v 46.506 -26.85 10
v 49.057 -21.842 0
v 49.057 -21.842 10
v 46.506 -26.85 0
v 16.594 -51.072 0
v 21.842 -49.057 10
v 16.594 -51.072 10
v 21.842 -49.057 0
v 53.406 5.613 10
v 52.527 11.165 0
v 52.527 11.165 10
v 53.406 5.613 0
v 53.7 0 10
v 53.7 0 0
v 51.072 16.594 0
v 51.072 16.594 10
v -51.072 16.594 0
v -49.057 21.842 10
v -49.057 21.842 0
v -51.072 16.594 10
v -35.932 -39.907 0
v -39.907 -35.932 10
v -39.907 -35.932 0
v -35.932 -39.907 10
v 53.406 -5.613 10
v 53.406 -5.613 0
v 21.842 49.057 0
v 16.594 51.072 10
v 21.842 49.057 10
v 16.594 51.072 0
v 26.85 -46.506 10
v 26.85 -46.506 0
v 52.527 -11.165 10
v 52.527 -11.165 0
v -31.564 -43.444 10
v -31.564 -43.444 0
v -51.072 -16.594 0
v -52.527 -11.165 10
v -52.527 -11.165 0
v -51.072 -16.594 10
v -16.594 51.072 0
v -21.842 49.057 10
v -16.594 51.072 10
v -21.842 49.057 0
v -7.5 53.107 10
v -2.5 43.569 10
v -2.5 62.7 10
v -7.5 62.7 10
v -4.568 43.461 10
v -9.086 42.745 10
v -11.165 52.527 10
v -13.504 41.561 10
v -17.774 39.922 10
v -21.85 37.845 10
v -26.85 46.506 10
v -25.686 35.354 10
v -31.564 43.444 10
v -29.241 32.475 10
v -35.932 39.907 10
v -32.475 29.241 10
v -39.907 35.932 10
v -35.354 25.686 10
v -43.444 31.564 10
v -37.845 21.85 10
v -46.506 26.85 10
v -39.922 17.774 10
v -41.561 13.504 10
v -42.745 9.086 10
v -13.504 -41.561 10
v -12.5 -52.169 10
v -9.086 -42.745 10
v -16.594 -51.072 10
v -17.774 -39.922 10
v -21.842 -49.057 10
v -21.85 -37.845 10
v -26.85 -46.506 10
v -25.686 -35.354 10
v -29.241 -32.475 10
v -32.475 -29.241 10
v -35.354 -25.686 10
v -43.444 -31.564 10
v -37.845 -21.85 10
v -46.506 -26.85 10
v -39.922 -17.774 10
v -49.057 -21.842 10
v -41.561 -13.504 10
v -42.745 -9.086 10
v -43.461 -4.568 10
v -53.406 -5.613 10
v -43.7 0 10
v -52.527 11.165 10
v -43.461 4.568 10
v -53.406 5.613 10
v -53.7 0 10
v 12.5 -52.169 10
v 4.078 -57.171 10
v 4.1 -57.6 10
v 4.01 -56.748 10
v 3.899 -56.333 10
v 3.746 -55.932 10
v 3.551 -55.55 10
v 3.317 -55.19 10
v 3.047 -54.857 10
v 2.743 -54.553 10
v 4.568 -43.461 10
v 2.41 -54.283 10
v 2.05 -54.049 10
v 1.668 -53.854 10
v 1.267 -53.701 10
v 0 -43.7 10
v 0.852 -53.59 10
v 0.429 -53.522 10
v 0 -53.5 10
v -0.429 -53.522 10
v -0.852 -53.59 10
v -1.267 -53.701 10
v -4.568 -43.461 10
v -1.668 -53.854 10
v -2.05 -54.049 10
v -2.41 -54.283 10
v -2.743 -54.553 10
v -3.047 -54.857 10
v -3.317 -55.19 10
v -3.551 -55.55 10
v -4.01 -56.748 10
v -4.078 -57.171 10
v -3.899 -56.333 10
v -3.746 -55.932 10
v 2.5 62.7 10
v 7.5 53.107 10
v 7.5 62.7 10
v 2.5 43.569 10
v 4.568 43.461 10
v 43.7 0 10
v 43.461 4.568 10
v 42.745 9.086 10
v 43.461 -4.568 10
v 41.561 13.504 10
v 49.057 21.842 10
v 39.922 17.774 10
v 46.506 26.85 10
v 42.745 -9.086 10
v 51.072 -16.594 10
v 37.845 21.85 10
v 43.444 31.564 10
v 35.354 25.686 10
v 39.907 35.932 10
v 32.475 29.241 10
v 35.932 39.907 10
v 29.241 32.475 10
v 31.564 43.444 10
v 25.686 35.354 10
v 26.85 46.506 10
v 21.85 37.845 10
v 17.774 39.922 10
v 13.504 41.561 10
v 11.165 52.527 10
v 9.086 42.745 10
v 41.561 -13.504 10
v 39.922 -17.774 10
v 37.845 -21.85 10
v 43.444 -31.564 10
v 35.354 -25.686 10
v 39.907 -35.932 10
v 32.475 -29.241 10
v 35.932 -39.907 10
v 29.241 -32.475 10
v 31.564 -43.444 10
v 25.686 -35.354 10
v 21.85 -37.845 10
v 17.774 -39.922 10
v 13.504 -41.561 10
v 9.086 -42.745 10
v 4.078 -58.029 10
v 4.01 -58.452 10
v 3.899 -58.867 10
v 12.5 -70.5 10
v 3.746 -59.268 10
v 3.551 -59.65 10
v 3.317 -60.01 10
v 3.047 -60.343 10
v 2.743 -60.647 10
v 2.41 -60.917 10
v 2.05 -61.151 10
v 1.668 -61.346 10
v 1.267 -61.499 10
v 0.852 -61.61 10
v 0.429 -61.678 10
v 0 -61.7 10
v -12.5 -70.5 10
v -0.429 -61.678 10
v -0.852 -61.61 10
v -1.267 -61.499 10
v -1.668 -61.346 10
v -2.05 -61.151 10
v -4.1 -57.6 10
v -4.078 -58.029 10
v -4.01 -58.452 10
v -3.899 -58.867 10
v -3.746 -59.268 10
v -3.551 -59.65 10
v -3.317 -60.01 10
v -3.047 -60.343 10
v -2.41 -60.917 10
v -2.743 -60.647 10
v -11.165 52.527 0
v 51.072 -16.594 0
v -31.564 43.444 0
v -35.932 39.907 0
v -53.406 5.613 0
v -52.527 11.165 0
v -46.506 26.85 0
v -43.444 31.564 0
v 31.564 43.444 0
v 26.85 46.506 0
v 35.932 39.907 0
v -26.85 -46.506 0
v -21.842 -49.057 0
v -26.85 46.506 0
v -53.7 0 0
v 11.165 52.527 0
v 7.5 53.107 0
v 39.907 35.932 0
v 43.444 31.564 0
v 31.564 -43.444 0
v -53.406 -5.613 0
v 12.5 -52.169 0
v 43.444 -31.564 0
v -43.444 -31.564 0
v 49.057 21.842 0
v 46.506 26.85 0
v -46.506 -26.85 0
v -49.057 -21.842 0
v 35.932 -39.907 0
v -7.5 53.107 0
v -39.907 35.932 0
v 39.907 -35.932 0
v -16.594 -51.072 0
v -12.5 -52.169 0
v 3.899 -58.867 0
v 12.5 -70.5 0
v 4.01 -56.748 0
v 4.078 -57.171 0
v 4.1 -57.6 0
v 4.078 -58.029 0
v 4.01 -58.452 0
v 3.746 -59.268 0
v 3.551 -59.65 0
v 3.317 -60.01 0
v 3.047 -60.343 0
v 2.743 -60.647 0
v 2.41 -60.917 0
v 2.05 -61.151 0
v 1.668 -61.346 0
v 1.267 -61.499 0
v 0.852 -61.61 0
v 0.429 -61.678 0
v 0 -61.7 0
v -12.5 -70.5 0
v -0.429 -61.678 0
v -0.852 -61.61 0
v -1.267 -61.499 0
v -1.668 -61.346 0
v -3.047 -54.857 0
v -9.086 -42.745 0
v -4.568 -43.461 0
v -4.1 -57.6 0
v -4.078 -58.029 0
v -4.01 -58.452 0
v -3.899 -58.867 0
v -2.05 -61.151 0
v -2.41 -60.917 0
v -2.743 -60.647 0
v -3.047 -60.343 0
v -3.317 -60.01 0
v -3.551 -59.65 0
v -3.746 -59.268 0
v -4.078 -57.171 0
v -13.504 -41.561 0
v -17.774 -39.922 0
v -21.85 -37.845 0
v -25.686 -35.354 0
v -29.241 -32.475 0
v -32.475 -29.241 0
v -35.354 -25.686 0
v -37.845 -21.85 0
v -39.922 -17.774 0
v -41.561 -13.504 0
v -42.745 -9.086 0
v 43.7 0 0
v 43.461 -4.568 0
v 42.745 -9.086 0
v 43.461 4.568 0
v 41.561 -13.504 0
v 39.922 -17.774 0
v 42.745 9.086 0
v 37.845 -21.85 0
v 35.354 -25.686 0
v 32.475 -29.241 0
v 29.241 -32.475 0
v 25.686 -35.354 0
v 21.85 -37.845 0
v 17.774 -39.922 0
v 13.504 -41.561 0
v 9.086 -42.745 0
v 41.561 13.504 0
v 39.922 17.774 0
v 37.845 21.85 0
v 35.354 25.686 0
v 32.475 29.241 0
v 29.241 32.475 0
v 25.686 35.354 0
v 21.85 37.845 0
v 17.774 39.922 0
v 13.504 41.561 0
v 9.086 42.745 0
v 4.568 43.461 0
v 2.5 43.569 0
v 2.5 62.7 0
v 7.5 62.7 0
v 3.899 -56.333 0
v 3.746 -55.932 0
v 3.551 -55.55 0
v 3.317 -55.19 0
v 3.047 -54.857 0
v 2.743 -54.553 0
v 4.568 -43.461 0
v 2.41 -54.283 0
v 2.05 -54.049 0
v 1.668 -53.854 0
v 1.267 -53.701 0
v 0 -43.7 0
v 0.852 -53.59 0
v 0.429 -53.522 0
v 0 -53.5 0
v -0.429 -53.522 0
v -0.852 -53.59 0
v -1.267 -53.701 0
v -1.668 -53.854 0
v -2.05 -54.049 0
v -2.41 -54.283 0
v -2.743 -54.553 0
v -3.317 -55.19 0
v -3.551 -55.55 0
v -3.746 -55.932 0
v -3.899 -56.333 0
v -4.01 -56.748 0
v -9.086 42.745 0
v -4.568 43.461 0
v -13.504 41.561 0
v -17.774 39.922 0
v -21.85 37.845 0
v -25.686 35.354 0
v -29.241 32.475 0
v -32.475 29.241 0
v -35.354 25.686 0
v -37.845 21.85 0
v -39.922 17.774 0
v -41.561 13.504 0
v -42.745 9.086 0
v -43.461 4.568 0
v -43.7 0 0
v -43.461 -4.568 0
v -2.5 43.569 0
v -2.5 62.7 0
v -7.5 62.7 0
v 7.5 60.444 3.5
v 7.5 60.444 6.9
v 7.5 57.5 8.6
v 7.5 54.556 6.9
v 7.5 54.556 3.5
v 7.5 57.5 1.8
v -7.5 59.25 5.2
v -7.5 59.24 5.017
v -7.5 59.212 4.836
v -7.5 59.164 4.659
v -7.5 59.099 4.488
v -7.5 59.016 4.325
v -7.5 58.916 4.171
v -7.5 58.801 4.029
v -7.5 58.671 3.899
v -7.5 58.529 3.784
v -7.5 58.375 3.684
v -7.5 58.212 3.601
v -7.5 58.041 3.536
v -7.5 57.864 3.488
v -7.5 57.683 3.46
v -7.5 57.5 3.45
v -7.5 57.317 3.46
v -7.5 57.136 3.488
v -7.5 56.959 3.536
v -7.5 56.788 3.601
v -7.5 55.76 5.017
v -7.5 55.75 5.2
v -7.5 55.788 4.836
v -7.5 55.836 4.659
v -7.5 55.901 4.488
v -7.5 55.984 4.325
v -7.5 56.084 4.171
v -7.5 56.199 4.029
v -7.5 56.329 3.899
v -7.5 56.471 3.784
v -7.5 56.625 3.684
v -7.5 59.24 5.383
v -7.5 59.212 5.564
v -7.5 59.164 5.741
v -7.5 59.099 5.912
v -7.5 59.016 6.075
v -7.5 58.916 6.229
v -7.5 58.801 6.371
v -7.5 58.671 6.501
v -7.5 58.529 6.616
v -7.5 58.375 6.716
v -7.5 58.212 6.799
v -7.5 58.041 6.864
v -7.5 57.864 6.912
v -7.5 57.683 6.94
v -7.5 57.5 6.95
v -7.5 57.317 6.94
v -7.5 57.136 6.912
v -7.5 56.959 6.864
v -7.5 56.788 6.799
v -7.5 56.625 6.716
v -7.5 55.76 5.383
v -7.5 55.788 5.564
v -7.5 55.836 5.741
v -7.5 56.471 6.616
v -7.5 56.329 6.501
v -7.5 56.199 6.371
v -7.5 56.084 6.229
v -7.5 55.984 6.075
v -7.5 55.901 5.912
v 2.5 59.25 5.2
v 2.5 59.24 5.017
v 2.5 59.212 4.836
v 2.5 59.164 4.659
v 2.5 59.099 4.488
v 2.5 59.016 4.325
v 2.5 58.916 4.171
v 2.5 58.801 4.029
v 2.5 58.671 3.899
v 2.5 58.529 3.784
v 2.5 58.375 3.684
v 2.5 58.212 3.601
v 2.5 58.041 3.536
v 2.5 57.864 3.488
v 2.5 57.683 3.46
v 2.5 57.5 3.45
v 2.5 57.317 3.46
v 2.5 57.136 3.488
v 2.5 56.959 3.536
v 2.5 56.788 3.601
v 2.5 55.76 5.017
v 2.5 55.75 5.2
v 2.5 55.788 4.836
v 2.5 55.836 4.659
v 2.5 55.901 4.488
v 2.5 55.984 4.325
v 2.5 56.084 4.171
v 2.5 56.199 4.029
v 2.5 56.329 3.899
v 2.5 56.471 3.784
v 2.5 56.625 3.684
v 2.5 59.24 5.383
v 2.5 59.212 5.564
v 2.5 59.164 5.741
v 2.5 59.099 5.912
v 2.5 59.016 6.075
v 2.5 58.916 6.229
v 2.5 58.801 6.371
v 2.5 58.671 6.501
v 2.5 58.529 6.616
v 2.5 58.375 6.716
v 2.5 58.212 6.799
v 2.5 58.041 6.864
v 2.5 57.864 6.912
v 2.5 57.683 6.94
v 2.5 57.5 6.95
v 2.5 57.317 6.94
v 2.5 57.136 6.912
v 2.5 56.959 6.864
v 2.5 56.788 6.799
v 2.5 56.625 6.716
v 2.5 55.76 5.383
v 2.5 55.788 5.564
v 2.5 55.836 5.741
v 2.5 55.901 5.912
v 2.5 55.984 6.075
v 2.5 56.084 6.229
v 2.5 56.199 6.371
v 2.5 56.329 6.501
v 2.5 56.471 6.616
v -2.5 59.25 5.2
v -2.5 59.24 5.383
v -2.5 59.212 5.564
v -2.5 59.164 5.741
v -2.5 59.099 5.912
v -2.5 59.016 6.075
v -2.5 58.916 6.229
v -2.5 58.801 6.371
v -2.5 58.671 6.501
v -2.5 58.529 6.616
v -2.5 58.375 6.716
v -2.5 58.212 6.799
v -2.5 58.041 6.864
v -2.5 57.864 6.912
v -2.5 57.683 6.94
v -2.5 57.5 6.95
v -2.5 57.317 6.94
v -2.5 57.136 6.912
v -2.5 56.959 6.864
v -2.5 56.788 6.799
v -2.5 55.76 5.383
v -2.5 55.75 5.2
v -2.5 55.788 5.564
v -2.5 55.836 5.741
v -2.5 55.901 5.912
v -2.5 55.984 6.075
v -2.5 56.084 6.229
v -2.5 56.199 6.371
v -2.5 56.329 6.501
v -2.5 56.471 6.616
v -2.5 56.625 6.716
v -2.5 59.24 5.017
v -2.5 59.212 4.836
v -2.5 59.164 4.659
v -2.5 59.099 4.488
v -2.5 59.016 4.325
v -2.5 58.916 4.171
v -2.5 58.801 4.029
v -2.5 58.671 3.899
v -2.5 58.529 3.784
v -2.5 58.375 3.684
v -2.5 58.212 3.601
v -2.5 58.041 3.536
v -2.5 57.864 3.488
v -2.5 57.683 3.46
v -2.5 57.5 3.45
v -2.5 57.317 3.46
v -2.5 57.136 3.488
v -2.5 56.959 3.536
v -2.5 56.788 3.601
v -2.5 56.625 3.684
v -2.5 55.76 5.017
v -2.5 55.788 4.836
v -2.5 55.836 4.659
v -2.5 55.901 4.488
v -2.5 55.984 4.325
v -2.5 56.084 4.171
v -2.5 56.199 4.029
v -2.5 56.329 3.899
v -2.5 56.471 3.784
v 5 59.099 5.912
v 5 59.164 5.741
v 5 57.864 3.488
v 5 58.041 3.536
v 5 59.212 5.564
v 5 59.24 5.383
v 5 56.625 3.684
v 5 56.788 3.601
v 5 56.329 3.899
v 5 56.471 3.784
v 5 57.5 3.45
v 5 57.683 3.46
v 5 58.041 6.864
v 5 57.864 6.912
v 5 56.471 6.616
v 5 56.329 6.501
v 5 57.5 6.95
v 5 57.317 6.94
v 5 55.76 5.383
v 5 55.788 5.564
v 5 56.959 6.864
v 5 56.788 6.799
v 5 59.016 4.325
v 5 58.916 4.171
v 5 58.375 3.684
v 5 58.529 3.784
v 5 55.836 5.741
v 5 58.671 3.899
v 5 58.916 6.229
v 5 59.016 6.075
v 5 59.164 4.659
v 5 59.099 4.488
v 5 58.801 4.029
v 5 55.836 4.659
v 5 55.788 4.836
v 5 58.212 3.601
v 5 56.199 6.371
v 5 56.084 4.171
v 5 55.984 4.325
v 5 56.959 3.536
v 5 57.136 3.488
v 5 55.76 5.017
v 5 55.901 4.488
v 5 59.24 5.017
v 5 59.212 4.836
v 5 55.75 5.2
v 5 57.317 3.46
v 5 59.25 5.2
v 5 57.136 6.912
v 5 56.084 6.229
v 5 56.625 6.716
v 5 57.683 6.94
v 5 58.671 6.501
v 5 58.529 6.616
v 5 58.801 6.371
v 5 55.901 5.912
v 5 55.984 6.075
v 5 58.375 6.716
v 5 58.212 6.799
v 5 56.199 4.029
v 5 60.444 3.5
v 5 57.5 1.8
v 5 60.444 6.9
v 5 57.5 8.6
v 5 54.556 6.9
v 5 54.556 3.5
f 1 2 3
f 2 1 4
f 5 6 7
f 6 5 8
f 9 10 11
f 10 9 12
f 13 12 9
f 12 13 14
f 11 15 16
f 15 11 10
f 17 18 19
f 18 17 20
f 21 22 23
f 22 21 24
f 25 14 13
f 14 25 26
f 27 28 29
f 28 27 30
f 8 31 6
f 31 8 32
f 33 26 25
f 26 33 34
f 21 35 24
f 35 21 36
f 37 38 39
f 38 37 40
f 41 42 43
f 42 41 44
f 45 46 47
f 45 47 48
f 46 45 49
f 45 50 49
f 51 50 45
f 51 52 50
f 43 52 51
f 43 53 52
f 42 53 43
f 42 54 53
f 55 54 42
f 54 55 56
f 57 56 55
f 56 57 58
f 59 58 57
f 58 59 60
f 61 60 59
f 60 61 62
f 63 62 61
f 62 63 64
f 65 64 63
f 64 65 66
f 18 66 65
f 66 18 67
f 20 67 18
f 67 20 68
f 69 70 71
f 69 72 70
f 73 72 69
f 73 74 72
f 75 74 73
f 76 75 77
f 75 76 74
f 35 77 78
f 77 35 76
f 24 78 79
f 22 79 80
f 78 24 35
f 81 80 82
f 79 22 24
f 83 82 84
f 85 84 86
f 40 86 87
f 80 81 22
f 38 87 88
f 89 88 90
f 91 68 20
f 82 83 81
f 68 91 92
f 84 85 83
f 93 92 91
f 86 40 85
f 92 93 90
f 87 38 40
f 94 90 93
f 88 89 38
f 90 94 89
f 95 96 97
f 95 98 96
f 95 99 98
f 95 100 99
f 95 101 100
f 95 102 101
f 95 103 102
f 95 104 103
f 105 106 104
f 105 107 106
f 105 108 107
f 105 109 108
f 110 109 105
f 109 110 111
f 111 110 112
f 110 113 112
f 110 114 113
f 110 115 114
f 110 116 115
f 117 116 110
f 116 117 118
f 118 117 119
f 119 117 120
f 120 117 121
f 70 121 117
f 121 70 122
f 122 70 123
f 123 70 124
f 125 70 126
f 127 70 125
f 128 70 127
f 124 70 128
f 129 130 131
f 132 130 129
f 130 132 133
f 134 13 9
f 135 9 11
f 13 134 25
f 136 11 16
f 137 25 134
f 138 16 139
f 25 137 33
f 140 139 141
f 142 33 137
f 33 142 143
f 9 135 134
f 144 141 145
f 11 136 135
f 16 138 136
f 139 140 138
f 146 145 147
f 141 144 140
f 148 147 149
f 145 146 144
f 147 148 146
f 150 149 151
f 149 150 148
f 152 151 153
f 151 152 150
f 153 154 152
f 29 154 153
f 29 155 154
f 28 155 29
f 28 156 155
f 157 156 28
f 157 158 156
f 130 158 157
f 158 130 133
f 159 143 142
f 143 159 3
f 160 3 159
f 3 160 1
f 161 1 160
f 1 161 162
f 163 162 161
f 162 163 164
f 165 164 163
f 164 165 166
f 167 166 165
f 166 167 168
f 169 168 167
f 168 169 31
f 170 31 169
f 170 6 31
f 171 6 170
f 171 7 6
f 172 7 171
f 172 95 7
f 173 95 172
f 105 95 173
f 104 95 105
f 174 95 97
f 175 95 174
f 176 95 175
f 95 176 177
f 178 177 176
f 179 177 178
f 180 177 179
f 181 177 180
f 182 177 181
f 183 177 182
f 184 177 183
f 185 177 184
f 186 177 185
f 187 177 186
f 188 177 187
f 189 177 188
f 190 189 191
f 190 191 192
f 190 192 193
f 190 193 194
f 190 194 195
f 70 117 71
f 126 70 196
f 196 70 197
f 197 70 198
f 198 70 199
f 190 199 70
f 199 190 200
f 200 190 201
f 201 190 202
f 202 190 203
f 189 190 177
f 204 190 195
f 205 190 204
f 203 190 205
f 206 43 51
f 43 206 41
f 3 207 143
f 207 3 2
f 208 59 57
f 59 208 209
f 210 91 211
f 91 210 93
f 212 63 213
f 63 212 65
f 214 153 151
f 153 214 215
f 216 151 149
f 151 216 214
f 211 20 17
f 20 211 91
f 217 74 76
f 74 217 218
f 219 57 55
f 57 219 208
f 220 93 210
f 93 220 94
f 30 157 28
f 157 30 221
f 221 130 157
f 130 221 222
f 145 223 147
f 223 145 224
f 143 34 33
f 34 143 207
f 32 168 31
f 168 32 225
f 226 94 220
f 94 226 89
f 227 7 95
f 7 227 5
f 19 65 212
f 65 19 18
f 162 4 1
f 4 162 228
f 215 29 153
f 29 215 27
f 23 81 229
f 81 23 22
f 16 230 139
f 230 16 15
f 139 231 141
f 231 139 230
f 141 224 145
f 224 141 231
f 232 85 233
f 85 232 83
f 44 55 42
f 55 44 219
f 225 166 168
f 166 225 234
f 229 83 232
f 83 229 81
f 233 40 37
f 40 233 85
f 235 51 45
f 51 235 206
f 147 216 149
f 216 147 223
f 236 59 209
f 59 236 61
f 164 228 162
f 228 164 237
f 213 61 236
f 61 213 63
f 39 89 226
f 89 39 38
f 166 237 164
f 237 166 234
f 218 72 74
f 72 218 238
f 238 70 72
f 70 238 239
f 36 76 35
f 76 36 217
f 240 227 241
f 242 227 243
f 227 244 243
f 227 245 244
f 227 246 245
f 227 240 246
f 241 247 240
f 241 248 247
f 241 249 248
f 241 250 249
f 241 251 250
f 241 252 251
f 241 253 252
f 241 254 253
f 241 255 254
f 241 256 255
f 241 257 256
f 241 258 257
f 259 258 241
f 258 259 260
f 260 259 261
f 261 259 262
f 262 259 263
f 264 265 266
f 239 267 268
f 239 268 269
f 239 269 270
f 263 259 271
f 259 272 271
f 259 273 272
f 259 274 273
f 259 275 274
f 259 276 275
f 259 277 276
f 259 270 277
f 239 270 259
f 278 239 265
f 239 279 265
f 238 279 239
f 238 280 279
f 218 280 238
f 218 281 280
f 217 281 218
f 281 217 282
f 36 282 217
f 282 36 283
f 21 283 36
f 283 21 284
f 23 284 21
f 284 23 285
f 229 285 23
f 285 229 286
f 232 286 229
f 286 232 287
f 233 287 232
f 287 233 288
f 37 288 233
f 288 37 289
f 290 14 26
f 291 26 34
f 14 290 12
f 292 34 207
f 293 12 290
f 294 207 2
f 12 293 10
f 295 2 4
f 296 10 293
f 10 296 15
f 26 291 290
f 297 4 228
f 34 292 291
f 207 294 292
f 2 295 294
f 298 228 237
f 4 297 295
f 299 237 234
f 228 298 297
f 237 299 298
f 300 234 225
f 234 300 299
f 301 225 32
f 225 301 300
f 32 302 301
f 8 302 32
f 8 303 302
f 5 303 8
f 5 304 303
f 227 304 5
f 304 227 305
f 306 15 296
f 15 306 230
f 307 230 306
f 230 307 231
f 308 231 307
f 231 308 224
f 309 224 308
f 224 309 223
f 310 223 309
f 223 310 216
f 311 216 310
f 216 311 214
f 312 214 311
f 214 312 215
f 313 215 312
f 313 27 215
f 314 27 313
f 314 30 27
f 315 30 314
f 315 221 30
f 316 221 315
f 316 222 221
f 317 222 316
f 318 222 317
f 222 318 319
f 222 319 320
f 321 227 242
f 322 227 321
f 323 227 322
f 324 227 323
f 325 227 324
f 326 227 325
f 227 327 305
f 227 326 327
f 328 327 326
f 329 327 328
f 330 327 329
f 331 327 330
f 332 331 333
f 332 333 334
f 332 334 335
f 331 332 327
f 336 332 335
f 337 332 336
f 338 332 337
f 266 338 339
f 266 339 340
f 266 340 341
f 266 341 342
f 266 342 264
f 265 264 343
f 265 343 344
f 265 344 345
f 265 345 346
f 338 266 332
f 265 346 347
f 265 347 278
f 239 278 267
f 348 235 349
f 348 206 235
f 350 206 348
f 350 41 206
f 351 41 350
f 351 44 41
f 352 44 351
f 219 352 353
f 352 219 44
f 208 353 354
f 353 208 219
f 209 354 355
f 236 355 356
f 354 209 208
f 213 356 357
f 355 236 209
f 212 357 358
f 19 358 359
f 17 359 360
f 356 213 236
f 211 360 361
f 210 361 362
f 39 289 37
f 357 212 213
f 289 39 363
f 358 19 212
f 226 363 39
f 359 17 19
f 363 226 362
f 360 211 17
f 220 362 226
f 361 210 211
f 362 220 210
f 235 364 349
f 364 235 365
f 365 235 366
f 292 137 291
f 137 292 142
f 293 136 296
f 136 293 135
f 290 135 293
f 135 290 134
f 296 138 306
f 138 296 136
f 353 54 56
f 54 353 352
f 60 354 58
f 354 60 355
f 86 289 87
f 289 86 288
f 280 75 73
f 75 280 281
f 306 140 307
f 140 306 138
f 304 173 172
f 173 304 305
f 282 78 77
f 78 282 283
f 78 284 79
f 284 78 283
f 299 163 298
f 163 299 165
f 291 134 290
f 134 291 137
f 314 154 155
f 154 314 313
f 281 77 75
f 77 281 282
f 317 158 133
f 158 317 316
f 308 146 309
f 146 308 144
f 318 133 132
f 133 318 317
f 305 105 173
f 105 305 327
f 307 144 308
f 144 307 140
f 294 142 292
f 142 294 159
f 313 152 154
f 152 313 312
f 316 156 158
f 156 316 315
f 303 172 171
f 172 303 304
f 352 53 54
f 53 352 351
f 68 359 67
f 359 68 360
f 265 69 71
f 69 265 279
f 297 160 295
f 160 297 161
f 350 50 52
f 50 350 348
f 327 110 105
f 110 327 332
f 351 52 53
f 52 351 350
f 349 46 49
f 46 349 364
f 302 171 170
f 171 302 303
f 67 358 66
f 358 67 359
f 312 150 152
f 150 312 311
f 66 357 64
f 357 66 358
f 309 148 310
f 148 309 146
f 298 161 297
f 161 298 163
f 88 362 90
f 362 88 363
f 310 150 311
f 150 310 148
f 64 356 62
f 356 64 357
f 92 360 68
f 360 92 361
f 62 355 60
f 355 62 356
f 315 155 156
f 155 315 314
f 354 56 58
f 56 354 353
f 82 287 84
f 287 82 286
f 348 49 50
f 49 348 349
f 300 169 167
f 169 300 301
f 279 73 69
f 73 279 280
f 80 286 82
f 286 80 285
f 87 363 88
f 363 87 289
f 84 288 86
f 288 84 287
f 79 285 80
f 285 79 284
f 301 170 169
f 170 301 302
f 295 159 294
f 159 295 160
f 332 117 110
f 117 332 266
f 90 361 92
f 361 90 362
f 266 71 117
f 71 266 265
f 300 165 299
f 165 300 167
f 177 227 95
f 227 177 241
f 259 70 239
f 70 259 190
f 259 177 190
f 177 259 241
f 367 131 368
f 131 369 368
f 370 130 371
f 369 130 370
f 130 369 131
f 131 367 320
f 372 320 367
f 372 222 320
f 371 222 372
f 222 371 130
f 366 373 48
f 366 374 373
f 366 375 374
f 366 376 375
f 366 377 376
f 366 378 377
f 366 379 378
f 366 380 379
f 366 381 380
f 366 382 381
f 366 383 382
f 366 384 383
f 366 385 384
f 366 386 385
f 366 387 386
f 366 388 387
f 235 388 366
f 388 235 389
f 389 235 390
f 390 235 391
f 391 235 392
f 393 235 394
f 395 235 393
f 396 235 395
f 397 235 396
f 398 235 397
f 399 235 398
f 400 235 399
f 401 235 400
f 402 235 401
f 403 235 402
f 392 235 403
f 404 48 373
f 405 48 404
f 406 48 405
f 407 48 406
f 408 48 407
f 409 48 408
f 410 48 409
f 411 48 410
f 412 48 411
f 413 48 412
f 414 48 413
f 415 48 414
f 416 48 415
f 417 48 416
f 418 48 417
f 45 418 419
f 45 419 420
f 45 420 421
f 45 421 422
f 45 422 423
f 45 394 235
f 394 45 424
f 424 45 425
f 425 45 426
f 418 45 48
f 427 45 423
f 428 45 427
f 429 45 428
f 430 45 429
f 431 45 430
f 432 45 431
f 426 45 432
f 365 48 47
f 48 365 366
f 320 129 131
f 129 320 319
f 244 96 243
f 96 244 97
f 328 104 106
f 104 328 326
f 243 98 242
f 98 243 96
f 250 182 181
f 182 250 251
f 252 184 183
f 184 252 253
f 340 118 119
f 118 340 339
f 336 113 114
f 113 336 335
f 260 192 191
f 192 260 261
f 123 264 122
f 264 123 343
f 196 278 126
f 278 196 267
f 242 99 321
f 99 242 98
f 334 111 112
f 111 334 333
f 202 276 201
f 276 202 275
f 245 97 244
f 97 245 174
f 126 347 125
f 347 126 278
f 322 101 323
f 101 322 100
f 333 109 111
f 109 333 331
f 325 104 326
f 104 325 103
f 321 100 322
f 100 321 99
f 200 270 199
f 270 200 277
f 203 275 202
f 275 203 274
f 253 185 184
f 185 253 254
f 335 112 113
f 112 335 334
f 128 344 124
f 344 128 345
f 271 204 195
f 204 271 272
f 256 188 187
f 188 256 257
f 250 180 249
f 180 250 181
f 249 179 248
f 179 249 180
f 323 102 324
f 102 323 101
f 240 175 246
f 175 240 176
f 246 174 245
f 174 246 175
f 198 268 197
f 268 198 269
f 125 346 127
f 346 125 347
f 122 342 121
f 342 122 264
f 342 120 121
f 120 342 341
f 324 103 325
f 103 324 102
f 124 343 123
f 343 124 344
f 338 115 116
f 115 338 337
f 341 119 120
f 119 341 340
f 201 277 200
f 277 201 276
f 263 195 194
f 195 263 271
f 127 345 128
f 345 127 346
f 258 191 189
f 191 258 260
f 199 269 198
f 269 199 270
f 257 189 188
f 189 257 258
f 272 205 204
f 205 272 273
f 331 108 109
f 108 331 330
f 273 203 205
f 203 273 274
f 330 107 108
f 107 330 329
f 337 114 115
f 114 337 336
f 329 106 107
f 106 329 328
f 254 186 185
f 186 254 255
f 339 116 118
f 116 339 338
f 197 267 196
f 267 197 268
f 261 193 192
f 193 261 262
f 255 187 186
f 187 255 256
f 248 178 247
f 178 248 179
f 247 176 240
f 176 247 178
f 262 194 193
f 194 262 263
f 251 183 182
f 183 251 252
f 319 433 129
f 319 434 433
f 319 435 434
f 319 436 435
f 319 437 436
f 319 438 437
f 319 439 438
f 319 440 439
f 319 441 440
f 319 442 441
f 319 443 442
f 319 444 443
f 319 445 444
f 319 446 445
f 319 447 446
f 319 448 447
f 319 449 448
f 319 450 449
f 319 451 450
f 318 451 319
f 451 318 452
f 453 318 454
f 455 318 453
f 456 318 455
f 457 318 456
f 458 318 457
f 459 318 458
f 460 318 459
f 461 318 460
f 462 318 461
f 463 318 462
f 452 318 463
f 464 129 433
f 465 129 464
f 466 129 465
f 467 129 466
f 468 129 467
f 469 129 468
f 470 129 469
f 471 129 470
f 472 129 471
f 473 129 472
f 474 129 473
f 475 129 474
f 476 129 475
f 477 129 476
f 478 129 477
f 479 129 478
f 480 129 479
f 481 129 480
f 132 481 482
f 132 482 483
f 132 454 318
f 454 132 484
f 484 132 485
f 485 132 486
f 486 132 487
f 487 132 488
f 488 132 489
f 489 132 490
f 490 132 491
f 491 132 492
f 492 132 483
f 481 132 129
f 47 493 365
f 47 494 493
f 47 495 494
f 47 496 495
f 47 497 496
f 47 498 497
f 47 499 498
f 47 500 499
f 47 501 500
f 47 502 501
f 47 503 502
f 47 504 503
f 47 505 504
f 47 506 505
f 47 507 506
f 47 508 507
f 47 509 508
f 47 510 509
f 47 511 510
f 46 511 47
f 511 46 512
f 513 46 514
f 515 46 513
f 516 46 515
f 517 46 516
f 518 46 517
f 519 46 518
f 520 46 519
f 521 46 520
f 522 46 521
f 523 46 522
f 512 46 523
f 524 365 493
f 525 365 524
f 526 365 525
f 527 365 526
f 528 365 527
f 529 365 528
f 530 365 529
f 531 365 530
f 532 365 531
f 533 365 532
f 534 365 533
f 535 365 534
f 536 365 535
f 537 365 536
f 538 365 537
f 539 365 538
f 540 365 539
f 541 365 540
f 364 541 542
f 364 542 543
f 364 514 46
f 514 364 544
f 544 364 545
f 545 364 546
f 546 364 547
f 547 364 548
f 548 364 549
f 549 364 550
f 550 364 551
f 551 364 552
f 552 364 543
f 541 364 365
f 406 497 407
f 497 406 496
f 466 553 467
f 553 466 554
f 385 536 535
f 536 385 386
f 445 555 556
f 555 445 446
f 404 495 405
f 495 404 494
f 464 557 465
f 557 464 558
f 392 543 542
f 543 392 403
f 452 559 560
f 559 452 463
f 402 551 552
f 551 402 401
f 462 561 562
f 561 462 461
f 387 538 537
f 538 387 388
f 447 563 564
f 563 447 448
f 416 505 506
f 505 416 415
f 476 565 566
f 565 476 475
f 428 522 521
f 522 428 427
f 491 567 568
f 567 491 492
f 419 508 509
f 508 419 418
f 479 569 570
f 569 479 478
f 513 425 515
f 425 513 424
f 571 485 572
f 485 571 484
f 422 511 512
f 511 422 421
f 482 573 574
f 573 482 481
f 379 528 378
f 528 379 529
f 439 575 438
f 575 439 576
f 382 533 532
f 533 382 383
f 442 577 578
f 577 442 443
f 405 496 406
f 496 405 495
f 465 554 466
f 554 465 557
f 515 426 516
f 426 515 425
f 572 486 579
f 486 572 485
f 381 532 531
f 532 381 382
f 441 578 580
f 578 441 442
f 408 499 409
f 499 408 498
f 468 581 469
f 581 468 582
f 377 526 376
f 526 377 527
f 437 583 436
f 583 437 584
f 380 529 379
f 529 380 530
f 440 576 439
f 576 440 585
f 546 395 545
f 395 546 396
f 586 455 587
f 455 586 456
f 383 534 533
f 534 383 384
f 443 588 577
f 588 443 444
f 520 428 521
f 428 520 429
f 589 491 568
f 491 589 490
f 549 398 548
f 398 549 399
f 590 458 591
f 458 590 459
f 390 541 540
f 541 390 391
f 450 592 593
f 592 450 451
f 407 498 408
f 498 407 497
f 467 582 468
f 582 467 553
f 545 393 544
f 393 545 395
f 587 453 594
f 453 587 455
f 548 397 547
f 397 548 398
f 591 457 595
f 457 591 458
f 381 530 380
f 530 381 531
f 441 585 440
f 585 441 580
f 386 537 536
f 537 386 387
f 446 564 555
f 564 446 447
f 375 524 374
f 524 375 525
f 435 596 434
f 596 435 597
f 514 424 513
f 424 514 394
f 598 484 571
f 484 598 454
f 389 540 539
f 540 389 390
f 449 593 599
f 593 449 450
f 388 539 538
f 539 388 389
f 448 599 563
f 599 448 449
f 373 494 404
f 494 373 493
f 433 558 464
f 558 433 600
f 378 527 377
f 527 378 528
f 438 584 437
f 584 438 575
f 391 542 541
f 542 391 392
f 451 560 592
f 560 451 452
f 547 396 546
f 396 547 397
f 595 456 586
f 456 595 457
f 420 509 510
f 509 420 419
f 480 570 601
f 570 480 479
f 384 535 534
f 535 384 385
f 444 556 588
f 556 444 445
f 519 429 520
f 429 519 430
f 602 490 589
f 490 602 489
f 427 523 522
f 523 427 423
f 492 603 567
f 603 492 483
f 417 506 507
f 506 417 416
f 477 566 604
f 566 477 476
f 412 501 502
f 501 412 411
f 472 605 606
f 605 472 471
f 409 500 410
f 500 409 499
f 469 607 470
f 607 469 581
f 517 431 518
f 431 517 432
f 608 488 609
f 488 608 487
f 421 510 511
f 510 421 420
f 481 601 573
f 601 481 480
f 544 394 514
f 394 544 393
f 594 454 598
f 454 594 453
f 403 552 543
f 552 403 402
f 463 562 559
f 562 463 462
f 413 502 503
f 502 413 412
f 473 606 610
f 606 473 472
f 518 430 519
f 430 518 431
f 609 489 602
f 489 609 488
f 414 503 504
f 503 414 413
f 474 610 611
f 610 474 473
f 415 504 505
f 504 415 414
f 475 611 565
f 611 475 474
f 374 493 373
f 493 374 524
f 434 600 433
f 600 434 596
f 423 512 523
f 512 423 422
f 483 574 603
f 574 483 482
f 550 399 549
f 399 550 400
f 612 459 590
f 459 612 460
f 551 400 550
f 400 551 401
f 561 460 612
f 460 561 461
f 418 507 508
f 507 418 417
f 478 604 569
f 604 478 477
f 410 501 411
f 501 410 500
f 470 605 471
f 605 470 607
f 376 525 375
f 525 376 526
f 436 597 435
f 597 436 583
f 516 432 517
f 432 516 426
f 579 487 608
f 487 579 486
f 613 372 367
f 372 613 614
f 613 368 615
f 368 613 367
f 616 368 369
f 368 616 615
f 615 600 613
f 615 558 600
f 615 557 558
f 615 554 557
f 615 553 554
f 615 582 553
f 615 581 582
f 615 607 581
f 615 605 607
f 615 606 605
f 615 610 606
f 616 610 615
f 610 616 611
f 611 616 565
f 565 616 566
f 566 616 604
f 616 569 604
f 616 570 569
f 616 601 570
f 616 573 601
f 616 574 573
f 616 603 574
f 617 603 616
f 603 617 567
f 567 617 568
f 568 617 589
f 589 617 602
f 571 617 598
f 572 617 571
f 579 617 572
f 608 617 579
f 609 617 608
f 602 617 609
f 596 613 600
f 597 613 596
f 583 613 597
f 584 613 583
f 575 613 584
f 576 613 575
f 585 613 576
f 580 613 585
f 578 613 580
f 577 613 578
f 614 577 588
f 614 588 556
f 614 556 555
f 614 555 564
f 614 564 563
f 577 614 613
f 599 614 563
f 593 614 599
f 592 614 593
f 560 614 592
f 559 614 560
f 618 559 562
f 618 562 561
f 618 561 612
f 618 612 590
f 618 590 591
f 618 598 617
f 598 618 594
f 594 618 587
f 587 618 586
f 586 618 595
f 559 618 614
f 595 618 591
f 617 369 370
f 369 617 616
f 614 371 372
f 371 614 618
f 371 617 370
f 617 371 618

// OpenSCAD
// file: bottle_holder.scad
// Holder for wine bottles
// License GNU AFFERO GENERAL PUBLIC LICENSE v3+
// Copyright 2014 Christian Ege


wineBottleBodyDiameter = 87;
wineBottleNeckDiameter1 = 31;
wineBottleNeckDiameter2 = 32;

clearance = 0.2;
holder_ring_x = 10;
holder_ring_y= 10;
holder_ring_z = 10;
holder_path_z = 10;
holder_path_x = 25;
holder_path_y = ((wineBottleBodyDiameter -wineBottleNeckDiameter2) /2.0)+20+2;
uholder_path_y = 25;

stand_x = 95;
stand_y = 120;
stand_z = 8;

threadedRodHole = 8.0+clearance;

module lower_ring() {
	difference() {
		cylinder(h = holder_ring_z, r=((wineBottleNeckDiameter1+2*holder_ring_y )/2.0)+clearance, $fn=60);
		translate([0,0,-clearance]) {
			cylinder(h = holder_ring_z+2*clearance, r1=(wineBottleNeckDiameter1/2.0)+clearance, r2=(wineBottleNeckDiameter2/2.0)+clearance, $fn=60);
		}
	}

}

module upper_ring() {
	difference() {
		cylinder(h = holder_ring_z, r=((wineBottleBodyDiameter+2*holder_ring_y )/2.0)+clearance, $fn=60);
		translate([0,0,-clearance]) {
			cylinder(h = holder_ring_z+2*clearance, r=(wineBottleBodyDiameter/2.0)+clearance, $fn=60);
		}
	}

}


module lower_path() {
	difference() {
		cube(size = [holder_path_x,holder_path_y,holder_path_z], center = true);
	}
}

module upper_path() {
		#cube(size = [holder_path_x,uholder_path_y,holder_path_z], center = true);
}


module lower_holder() {
	difference () {
		union () {
			lower_ring();
			translate([0,-((holder_path_y+wineBottleNeckDiameter2)/2.0)-2,holder_path_z /2.0]) {
				lower_path();
			}
		}
			drill_hole();

		}
}

module upper_holder() {
	difference () {
		union () {
			upper_ring();
			translate([0,-((uholder_path_y+wineBottleBodyDiameter)/2.0 +2 ),holder_path_z /2.0]) {
				upper_path();
			}
			translate([0,(wineBottleBodyDiameter)/2 +holder_ring_y+4 ,holder_ring_z/2 ])
				cube(size = [15,holder_ring_y+2*clearance,holder_ring_z], center = true);
		}
		drill_hole();
		translate([0,(wineBottleBodyDiameter+holder_ring_y)/2 +clearance ,holder_ring_z/2 + clearance ]) #cube(size = [5,holder_ring_y+20+2*clearance,holder_ring_z+2*clearance], center = true);

		translate([-50,(wineBottleBodyDiameter)/2 +holder_ring_y+4 ,holder_ring_z/2 + clearance ]) {
			rotate ([0,90,0])  cylinder(h=100+2*clearance ,r=3.5/2.0, $fn=60);
		}
		translate([+7.5-2.5,(wineBottleBodyDiameter)/2 +holder_ring_y+4 ,holder_ring_z/2 + clearance ])
			rotate ([0,90,0])  cylinder(h=100+2*clearance ,r=6.8/2.0, $fn=6);


		}
}


module drill_hole () {
		translate([0,-(wineBottleBodyDiameter/2+10+threadedRodHole/2) ,-(holder_path_z/2)]) {
			#cylinder(h=100+2*clearance ,r=threadedRodHole/2.0, $fn=60);
		}
	}
module stand () {
	difference () {
		union () {
			translate([0,-holder_path_y/2,0]) cube(size = [stand_x,stand_y,stand_z], center = true);
			translate([0,-(wineBottleBodyDiameter/2+10+threadedRodHole/2),0] ) cylinder(h=50 ,r2=threadedRodHole/2.0 +5, r1=threadedRodHole/2.0 +8, $fn=60);


		}
		drill_hole();
		translate( [0,-(wineBottleBodyDiameter/2+10+threadedRodHole/2),-(stand_z/2+clearance)]) #cylinder(h=7.5 ,r=14.7/2+clearance, $fn=6);

		for ( i = [-10	:1.0: 35] )
		{
			translate( [0,i,-(stand_z/2+clearance)]) #cylinder(h=stand_z+2*clearance ,r=25, $fn=50);
		}

	}
}

module triangle () {
	b = 15;
	h = 50;
	w = 5;
	rotate(a=[90,-90,0]) {
		linear_extrude(height = w, center = true, convexity = 10, twist = 0)
			polygon(points=[[0,0],[h,0],[0,b]], paths=[[0,1,2]]);
	}
}

module base () {

	translate([-((threadedRodHole/2.0 +5)-clearance),-(wineBottleBodyDiameter/2+10+threadedRodHole/2),0 ]) triangle();
	translate([+((threadedRodHole/2.0 +5)-clearance),-(wineBottleBodyDiameter/2+10+threadedRodHole/2),0 ])
		rotate([0,0,180])triangle();

	translate([0,-(wineBottleBodyDiameter/2+(10-threadedRodHole/2)),0 ])
		rotate([0,0,270])triangle();

	translate([0,-(wineBottleBodyDiameter/2+10+threadedRodHole+5),0 ])
		rotate([0,0,90])triangle();


	translate([0,-(wineBottleBodyDiameter/2+10+threadedRodHole/2) ,7.5-0.5 ])
	cylinder(h=0.1 ,r=14.5/2+clearance, $fn=10);

translate ([0,0,stand_z/2]) stand();
}

base();
//lower_holder();
//upper_holder();
//lower_path();
// main file
// Holder for wine bottles
// License GNU AFFERO GENERAL PUBLIC LICENSE v3+
// Copyright 2014 Christian Ege

use <bottle_holder.scad>

upper_holder();
